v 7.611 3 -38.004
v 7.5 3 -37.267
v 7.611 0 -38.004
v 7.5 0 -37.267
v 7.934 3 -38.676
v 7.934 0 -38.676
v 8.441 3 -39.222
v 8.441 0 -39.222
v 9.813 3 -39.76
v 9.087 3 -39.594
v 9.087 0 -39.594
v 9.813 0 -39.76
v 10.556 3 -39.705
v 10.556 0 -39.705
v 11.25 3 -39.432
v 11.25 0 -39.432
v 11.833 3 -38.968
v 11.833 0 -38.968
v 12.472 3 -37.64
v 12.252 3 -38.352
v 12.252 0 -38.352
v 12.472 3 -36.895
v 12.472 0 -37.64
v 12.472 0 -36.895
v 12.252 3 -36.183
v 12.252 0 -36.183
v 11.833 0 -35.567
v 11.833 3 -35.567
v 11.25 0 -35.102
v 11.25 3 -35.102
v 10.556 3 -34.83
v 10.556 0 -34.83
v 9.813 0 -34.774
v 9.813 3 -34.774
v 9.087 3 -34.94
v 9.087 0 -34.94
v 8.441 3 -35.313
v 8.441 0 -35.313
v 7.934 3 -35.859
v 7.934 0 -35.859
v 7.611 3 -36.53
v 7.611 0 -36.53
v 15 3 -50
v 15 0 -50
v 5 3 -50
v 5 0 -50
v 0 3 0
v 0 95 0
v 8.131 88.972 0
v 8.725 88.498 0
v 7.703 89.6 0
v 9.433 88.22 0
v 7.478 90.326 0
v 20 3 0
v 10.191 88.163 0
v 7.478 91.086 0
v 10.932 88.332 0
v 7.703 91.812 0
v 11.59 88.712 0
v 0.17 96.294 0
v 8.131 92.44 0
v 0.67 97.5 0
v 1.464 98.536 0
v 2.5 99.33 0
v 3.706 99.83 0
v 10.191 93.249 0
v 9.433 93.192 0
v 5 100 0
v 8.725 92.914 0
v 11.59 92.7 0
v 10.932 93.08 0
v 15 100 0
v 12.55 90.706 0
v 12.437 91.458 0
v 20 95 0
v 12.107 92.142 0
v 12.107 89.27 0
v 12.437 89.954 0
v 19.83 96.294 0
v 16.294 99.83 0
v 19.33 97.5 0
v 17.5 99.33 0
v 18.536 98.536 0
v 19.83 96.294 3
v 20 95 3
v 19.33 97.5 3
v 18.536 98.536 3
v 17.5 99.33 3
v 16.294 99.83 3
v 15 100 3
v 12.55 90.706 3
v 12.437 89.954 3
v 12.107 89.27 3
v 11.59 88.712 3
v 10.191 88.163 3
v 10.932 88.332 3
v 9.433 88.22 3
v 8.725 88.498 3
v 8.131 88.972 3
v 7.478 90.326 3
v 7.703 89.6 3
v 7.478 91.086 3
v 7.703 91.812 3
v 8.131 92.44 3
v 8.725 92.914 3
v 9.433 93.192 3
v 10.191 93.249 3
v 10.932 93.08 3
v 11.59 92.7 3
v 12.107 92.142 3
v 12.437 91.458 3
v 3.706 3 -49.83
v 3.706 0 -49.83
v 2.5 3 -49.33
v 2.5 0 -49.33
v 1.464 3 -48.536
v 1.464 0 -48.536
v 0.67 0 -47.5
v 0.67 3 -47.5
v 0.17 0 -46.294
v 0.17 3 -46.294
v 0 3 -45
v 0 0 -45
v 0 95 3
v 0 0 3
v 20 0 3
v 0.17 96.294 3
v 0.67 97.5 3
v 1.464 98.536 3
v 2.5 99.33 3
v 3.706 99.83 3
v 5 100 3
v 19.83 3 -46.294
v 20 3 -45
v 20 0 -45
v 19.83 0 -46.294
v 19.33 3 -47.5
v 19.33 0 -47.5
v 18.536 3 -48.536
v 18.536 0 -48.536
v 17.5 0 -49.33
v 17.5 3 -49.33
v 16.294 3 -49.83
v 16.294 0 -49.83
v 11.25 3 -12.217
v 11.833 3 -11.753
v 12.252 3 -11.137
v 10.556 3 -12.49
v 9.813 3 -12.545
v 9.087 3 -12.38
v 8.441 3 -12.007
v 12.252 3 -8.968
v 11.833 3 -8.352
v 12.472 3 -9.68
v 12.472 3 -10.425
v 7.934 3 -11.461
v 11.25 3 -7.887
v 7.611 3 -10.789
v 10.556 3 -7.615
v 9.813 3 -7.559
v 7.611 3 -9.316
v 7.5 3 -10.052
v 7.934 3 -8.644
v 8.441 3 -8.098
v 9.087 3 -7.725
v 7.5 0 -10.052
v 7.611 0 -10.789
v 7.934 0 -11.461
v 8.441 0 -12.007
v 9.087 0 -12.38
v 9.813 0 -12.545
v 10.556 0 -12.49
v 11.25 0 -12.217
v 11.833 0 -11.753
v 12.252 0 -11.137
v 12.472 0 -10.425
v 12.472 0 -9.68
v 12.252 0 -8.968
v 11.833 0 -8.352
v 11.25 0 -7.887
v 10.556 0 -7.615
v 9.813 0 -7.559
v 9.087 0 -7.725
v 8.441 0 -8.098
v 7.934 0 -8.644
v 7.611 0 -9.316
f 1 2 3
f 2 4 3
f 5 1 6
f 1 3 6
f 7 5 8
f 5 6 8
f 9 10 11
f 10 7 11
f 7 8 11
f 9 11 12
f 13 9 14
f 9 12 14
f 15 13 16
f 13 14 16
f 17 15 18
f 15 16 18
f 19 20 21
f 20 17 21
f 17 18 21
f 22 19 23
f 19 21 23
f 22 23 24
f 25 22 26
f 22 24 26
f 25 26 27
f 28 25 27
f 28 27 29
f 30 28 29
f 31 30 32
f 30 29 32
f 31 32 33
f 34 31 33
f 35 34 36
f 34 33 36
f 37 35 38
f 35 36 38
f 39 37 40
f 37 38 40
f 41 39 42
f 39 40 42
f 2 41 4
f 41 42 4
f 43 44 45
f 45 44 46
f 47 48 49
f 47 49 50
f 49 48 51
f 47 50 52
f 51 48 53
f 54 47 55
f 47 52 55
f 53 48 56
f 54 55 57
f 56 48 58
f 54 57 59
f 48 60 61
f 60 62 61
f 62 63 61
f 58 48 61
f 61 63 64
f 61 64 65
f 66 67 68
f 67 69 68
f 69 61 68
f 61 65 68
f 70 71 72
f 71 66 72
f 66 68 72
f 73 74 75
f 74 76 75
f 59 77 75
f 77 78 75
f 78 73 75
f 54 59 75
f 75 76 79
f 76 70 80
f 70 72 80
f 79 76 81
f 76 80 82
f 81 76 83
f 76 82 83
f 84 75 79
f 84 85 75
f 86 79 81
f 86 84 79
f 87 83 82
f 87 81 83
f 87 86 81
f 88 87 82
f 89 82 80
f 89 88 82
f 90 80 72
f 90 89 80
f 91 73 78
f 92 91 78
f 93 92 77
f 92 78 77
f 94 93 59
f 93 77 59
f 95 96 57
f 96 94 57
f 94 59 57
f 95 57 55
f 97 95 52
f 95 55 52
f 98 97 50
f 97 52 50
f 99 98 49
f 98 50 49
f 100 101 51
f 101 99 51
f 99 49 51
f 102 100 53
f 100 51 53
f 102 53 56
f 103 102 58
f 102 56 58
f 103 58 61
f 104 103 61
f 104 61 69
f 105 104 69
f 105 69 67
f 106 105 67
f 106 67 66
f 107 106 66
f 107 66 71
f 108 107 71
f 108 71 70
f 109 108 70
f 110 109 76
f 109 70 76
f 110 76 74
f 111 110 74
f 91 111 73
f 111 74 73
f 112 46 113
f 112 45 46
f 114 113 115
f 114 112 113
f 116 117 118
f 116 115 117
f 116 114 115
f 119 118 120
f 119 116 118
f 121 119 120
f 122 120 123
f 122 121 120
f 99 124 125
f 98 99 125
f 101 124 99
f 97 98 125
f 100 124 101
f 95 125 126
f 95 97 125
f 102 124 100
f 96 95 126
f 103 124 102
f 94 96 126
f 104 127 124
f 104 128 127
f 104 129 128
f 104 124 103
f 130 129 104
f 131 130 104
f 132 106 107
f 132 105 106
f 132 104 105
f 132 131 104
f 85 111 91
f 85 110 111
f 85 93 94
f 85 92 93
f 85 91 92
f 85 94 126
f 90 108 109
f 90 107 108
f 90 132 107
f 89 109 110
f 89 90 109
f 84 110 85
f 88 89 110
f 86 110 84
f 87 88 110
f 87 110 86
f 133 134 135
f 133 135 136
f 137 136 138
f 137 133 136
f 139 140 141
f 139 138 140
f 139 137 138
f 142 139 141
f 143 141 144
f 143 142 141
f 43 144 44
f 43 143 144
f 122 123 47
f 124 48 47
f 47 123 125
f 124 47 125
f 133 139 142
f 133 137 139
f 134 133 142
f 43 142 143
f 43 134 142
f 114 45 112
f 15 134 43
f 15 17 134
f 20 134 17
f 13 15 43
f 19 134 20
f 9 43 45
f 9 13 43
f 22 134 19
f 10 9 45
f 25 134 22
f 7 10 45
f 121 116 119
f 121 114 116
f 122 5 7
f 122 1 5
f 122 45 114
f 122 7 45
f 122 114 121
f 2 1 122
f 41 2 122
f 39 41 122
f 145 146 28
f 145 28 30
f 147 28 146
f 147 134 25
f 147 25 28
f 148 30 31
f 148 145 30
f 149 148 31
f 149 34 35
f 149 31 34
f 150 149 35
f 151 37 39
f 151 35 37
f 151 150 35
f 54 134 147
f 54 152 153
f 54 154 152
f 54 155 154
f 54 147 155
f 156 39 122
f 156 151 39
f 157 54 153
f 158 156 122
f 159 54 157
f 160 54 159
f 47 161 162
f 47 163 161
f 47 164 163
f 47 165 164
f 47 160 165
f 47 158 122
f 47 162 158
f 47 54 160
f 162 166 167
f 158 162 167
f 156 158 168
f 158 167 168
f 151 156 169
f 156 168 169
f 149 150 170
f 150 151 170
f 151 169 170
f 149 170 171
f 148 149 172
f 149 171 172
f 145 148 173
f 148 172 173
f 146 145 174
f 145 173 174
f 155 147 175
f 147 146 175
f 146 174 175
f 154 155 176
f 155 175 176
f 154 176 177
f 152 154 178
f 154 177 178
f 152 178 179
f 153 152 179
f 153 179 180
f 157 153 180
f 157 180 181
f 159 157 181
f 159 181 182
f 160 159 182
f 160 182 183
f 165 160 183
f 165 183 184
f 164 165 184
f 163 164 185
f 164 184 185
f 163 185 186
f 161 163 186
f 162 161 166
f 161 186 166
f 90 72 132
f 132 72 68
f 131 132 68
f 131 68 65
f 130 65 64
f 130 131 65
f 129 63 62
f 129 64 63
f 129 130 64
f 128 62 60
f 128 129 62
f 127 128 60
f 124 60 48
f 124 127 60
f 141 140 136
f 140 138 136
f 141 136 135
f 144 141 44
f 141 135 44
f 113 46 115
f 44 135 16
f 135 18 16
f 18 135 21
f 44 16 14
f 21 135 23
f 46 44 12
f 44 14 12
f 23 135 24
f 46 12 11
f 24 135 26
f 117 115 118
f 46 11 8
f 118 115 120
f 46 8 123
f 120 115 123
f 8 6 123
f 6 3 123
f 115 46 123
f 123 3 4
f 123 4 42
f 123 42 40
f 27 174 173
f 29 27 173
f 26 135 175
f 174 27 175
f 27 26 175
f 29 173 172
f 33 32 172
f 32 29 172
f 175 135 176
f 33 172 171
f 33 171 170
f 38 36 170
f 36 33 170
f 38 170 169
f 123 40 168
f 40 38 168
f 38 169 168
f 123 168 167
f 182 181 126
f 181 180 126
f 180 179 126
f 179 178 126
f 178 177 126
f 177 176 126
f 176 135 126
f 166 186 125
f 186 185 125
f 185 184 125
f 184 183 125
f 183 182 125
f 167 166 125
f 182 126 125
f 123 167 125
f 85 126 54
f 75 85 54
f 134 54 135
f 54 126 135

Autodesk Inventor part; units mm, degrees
ref_plane "YZ Plane" through (0, 0, 0) normal (1, 0, 0) x (0, 1, 0)
ref_plane "XZ Plane" through (0, 0, 0) normal (0, 1, 0) x (-1, 0, 0)
ref_plane "XY Plane" through (0, 0, 0) normal (0, 0, 1) x (1, 0, 0)
sketch "Sketch1" plane through (0, 0, 0) normal (0, 1, 0) x (-1, 0, 0)
  line L0 (0, 0) -> (-20, 0)
  line L1 (-20, 0) -> (-20, -50)
  line L2 (-20, -50) -> (0, -50)
  line L3 (0, -50) -> (0, 0)
  circle A0 centre (-10, -10.0524) radius 2.5
  circle A1 centre (-10, -37.2673) radius 2.5
  dimension "d0" = 20
  dimension "d1" = 50
  dimension "d2" = 5
  dimension "d3" = 5
extrude "Extrusion1" add sketch "Sketch1" along normal blind 3
sketch "Sketch2" plane through (0, 0, 0) normal (0, 0, 1) x (1, 0, 0)
  line L0 (0, 0) -> (20, 0)
  line L1 (20, 0) -> (20, 100)
  line L2 (20, 100) -> (0, 100)
  line L3 (0, 100) -> (0, 0)
  circle A0 centre (10, 90.706) radius 2.55
  dimension "d6" = 20
  dimension "d7" = 100
  dimension "d8" = 5.1
  dimension "d9" = 90.706
extrude "Extrusion2" add sketch "Sketch2" along normal blind 3
fillet "Fillet1" radius 5 2 edges at (20, 1.5, -50) (0, 1.5, -50)
fillet "Fillet2" radius 5 2 edges at (20, 100, 1.5) (0, 100, 1.5)
properties part number "support bar"
